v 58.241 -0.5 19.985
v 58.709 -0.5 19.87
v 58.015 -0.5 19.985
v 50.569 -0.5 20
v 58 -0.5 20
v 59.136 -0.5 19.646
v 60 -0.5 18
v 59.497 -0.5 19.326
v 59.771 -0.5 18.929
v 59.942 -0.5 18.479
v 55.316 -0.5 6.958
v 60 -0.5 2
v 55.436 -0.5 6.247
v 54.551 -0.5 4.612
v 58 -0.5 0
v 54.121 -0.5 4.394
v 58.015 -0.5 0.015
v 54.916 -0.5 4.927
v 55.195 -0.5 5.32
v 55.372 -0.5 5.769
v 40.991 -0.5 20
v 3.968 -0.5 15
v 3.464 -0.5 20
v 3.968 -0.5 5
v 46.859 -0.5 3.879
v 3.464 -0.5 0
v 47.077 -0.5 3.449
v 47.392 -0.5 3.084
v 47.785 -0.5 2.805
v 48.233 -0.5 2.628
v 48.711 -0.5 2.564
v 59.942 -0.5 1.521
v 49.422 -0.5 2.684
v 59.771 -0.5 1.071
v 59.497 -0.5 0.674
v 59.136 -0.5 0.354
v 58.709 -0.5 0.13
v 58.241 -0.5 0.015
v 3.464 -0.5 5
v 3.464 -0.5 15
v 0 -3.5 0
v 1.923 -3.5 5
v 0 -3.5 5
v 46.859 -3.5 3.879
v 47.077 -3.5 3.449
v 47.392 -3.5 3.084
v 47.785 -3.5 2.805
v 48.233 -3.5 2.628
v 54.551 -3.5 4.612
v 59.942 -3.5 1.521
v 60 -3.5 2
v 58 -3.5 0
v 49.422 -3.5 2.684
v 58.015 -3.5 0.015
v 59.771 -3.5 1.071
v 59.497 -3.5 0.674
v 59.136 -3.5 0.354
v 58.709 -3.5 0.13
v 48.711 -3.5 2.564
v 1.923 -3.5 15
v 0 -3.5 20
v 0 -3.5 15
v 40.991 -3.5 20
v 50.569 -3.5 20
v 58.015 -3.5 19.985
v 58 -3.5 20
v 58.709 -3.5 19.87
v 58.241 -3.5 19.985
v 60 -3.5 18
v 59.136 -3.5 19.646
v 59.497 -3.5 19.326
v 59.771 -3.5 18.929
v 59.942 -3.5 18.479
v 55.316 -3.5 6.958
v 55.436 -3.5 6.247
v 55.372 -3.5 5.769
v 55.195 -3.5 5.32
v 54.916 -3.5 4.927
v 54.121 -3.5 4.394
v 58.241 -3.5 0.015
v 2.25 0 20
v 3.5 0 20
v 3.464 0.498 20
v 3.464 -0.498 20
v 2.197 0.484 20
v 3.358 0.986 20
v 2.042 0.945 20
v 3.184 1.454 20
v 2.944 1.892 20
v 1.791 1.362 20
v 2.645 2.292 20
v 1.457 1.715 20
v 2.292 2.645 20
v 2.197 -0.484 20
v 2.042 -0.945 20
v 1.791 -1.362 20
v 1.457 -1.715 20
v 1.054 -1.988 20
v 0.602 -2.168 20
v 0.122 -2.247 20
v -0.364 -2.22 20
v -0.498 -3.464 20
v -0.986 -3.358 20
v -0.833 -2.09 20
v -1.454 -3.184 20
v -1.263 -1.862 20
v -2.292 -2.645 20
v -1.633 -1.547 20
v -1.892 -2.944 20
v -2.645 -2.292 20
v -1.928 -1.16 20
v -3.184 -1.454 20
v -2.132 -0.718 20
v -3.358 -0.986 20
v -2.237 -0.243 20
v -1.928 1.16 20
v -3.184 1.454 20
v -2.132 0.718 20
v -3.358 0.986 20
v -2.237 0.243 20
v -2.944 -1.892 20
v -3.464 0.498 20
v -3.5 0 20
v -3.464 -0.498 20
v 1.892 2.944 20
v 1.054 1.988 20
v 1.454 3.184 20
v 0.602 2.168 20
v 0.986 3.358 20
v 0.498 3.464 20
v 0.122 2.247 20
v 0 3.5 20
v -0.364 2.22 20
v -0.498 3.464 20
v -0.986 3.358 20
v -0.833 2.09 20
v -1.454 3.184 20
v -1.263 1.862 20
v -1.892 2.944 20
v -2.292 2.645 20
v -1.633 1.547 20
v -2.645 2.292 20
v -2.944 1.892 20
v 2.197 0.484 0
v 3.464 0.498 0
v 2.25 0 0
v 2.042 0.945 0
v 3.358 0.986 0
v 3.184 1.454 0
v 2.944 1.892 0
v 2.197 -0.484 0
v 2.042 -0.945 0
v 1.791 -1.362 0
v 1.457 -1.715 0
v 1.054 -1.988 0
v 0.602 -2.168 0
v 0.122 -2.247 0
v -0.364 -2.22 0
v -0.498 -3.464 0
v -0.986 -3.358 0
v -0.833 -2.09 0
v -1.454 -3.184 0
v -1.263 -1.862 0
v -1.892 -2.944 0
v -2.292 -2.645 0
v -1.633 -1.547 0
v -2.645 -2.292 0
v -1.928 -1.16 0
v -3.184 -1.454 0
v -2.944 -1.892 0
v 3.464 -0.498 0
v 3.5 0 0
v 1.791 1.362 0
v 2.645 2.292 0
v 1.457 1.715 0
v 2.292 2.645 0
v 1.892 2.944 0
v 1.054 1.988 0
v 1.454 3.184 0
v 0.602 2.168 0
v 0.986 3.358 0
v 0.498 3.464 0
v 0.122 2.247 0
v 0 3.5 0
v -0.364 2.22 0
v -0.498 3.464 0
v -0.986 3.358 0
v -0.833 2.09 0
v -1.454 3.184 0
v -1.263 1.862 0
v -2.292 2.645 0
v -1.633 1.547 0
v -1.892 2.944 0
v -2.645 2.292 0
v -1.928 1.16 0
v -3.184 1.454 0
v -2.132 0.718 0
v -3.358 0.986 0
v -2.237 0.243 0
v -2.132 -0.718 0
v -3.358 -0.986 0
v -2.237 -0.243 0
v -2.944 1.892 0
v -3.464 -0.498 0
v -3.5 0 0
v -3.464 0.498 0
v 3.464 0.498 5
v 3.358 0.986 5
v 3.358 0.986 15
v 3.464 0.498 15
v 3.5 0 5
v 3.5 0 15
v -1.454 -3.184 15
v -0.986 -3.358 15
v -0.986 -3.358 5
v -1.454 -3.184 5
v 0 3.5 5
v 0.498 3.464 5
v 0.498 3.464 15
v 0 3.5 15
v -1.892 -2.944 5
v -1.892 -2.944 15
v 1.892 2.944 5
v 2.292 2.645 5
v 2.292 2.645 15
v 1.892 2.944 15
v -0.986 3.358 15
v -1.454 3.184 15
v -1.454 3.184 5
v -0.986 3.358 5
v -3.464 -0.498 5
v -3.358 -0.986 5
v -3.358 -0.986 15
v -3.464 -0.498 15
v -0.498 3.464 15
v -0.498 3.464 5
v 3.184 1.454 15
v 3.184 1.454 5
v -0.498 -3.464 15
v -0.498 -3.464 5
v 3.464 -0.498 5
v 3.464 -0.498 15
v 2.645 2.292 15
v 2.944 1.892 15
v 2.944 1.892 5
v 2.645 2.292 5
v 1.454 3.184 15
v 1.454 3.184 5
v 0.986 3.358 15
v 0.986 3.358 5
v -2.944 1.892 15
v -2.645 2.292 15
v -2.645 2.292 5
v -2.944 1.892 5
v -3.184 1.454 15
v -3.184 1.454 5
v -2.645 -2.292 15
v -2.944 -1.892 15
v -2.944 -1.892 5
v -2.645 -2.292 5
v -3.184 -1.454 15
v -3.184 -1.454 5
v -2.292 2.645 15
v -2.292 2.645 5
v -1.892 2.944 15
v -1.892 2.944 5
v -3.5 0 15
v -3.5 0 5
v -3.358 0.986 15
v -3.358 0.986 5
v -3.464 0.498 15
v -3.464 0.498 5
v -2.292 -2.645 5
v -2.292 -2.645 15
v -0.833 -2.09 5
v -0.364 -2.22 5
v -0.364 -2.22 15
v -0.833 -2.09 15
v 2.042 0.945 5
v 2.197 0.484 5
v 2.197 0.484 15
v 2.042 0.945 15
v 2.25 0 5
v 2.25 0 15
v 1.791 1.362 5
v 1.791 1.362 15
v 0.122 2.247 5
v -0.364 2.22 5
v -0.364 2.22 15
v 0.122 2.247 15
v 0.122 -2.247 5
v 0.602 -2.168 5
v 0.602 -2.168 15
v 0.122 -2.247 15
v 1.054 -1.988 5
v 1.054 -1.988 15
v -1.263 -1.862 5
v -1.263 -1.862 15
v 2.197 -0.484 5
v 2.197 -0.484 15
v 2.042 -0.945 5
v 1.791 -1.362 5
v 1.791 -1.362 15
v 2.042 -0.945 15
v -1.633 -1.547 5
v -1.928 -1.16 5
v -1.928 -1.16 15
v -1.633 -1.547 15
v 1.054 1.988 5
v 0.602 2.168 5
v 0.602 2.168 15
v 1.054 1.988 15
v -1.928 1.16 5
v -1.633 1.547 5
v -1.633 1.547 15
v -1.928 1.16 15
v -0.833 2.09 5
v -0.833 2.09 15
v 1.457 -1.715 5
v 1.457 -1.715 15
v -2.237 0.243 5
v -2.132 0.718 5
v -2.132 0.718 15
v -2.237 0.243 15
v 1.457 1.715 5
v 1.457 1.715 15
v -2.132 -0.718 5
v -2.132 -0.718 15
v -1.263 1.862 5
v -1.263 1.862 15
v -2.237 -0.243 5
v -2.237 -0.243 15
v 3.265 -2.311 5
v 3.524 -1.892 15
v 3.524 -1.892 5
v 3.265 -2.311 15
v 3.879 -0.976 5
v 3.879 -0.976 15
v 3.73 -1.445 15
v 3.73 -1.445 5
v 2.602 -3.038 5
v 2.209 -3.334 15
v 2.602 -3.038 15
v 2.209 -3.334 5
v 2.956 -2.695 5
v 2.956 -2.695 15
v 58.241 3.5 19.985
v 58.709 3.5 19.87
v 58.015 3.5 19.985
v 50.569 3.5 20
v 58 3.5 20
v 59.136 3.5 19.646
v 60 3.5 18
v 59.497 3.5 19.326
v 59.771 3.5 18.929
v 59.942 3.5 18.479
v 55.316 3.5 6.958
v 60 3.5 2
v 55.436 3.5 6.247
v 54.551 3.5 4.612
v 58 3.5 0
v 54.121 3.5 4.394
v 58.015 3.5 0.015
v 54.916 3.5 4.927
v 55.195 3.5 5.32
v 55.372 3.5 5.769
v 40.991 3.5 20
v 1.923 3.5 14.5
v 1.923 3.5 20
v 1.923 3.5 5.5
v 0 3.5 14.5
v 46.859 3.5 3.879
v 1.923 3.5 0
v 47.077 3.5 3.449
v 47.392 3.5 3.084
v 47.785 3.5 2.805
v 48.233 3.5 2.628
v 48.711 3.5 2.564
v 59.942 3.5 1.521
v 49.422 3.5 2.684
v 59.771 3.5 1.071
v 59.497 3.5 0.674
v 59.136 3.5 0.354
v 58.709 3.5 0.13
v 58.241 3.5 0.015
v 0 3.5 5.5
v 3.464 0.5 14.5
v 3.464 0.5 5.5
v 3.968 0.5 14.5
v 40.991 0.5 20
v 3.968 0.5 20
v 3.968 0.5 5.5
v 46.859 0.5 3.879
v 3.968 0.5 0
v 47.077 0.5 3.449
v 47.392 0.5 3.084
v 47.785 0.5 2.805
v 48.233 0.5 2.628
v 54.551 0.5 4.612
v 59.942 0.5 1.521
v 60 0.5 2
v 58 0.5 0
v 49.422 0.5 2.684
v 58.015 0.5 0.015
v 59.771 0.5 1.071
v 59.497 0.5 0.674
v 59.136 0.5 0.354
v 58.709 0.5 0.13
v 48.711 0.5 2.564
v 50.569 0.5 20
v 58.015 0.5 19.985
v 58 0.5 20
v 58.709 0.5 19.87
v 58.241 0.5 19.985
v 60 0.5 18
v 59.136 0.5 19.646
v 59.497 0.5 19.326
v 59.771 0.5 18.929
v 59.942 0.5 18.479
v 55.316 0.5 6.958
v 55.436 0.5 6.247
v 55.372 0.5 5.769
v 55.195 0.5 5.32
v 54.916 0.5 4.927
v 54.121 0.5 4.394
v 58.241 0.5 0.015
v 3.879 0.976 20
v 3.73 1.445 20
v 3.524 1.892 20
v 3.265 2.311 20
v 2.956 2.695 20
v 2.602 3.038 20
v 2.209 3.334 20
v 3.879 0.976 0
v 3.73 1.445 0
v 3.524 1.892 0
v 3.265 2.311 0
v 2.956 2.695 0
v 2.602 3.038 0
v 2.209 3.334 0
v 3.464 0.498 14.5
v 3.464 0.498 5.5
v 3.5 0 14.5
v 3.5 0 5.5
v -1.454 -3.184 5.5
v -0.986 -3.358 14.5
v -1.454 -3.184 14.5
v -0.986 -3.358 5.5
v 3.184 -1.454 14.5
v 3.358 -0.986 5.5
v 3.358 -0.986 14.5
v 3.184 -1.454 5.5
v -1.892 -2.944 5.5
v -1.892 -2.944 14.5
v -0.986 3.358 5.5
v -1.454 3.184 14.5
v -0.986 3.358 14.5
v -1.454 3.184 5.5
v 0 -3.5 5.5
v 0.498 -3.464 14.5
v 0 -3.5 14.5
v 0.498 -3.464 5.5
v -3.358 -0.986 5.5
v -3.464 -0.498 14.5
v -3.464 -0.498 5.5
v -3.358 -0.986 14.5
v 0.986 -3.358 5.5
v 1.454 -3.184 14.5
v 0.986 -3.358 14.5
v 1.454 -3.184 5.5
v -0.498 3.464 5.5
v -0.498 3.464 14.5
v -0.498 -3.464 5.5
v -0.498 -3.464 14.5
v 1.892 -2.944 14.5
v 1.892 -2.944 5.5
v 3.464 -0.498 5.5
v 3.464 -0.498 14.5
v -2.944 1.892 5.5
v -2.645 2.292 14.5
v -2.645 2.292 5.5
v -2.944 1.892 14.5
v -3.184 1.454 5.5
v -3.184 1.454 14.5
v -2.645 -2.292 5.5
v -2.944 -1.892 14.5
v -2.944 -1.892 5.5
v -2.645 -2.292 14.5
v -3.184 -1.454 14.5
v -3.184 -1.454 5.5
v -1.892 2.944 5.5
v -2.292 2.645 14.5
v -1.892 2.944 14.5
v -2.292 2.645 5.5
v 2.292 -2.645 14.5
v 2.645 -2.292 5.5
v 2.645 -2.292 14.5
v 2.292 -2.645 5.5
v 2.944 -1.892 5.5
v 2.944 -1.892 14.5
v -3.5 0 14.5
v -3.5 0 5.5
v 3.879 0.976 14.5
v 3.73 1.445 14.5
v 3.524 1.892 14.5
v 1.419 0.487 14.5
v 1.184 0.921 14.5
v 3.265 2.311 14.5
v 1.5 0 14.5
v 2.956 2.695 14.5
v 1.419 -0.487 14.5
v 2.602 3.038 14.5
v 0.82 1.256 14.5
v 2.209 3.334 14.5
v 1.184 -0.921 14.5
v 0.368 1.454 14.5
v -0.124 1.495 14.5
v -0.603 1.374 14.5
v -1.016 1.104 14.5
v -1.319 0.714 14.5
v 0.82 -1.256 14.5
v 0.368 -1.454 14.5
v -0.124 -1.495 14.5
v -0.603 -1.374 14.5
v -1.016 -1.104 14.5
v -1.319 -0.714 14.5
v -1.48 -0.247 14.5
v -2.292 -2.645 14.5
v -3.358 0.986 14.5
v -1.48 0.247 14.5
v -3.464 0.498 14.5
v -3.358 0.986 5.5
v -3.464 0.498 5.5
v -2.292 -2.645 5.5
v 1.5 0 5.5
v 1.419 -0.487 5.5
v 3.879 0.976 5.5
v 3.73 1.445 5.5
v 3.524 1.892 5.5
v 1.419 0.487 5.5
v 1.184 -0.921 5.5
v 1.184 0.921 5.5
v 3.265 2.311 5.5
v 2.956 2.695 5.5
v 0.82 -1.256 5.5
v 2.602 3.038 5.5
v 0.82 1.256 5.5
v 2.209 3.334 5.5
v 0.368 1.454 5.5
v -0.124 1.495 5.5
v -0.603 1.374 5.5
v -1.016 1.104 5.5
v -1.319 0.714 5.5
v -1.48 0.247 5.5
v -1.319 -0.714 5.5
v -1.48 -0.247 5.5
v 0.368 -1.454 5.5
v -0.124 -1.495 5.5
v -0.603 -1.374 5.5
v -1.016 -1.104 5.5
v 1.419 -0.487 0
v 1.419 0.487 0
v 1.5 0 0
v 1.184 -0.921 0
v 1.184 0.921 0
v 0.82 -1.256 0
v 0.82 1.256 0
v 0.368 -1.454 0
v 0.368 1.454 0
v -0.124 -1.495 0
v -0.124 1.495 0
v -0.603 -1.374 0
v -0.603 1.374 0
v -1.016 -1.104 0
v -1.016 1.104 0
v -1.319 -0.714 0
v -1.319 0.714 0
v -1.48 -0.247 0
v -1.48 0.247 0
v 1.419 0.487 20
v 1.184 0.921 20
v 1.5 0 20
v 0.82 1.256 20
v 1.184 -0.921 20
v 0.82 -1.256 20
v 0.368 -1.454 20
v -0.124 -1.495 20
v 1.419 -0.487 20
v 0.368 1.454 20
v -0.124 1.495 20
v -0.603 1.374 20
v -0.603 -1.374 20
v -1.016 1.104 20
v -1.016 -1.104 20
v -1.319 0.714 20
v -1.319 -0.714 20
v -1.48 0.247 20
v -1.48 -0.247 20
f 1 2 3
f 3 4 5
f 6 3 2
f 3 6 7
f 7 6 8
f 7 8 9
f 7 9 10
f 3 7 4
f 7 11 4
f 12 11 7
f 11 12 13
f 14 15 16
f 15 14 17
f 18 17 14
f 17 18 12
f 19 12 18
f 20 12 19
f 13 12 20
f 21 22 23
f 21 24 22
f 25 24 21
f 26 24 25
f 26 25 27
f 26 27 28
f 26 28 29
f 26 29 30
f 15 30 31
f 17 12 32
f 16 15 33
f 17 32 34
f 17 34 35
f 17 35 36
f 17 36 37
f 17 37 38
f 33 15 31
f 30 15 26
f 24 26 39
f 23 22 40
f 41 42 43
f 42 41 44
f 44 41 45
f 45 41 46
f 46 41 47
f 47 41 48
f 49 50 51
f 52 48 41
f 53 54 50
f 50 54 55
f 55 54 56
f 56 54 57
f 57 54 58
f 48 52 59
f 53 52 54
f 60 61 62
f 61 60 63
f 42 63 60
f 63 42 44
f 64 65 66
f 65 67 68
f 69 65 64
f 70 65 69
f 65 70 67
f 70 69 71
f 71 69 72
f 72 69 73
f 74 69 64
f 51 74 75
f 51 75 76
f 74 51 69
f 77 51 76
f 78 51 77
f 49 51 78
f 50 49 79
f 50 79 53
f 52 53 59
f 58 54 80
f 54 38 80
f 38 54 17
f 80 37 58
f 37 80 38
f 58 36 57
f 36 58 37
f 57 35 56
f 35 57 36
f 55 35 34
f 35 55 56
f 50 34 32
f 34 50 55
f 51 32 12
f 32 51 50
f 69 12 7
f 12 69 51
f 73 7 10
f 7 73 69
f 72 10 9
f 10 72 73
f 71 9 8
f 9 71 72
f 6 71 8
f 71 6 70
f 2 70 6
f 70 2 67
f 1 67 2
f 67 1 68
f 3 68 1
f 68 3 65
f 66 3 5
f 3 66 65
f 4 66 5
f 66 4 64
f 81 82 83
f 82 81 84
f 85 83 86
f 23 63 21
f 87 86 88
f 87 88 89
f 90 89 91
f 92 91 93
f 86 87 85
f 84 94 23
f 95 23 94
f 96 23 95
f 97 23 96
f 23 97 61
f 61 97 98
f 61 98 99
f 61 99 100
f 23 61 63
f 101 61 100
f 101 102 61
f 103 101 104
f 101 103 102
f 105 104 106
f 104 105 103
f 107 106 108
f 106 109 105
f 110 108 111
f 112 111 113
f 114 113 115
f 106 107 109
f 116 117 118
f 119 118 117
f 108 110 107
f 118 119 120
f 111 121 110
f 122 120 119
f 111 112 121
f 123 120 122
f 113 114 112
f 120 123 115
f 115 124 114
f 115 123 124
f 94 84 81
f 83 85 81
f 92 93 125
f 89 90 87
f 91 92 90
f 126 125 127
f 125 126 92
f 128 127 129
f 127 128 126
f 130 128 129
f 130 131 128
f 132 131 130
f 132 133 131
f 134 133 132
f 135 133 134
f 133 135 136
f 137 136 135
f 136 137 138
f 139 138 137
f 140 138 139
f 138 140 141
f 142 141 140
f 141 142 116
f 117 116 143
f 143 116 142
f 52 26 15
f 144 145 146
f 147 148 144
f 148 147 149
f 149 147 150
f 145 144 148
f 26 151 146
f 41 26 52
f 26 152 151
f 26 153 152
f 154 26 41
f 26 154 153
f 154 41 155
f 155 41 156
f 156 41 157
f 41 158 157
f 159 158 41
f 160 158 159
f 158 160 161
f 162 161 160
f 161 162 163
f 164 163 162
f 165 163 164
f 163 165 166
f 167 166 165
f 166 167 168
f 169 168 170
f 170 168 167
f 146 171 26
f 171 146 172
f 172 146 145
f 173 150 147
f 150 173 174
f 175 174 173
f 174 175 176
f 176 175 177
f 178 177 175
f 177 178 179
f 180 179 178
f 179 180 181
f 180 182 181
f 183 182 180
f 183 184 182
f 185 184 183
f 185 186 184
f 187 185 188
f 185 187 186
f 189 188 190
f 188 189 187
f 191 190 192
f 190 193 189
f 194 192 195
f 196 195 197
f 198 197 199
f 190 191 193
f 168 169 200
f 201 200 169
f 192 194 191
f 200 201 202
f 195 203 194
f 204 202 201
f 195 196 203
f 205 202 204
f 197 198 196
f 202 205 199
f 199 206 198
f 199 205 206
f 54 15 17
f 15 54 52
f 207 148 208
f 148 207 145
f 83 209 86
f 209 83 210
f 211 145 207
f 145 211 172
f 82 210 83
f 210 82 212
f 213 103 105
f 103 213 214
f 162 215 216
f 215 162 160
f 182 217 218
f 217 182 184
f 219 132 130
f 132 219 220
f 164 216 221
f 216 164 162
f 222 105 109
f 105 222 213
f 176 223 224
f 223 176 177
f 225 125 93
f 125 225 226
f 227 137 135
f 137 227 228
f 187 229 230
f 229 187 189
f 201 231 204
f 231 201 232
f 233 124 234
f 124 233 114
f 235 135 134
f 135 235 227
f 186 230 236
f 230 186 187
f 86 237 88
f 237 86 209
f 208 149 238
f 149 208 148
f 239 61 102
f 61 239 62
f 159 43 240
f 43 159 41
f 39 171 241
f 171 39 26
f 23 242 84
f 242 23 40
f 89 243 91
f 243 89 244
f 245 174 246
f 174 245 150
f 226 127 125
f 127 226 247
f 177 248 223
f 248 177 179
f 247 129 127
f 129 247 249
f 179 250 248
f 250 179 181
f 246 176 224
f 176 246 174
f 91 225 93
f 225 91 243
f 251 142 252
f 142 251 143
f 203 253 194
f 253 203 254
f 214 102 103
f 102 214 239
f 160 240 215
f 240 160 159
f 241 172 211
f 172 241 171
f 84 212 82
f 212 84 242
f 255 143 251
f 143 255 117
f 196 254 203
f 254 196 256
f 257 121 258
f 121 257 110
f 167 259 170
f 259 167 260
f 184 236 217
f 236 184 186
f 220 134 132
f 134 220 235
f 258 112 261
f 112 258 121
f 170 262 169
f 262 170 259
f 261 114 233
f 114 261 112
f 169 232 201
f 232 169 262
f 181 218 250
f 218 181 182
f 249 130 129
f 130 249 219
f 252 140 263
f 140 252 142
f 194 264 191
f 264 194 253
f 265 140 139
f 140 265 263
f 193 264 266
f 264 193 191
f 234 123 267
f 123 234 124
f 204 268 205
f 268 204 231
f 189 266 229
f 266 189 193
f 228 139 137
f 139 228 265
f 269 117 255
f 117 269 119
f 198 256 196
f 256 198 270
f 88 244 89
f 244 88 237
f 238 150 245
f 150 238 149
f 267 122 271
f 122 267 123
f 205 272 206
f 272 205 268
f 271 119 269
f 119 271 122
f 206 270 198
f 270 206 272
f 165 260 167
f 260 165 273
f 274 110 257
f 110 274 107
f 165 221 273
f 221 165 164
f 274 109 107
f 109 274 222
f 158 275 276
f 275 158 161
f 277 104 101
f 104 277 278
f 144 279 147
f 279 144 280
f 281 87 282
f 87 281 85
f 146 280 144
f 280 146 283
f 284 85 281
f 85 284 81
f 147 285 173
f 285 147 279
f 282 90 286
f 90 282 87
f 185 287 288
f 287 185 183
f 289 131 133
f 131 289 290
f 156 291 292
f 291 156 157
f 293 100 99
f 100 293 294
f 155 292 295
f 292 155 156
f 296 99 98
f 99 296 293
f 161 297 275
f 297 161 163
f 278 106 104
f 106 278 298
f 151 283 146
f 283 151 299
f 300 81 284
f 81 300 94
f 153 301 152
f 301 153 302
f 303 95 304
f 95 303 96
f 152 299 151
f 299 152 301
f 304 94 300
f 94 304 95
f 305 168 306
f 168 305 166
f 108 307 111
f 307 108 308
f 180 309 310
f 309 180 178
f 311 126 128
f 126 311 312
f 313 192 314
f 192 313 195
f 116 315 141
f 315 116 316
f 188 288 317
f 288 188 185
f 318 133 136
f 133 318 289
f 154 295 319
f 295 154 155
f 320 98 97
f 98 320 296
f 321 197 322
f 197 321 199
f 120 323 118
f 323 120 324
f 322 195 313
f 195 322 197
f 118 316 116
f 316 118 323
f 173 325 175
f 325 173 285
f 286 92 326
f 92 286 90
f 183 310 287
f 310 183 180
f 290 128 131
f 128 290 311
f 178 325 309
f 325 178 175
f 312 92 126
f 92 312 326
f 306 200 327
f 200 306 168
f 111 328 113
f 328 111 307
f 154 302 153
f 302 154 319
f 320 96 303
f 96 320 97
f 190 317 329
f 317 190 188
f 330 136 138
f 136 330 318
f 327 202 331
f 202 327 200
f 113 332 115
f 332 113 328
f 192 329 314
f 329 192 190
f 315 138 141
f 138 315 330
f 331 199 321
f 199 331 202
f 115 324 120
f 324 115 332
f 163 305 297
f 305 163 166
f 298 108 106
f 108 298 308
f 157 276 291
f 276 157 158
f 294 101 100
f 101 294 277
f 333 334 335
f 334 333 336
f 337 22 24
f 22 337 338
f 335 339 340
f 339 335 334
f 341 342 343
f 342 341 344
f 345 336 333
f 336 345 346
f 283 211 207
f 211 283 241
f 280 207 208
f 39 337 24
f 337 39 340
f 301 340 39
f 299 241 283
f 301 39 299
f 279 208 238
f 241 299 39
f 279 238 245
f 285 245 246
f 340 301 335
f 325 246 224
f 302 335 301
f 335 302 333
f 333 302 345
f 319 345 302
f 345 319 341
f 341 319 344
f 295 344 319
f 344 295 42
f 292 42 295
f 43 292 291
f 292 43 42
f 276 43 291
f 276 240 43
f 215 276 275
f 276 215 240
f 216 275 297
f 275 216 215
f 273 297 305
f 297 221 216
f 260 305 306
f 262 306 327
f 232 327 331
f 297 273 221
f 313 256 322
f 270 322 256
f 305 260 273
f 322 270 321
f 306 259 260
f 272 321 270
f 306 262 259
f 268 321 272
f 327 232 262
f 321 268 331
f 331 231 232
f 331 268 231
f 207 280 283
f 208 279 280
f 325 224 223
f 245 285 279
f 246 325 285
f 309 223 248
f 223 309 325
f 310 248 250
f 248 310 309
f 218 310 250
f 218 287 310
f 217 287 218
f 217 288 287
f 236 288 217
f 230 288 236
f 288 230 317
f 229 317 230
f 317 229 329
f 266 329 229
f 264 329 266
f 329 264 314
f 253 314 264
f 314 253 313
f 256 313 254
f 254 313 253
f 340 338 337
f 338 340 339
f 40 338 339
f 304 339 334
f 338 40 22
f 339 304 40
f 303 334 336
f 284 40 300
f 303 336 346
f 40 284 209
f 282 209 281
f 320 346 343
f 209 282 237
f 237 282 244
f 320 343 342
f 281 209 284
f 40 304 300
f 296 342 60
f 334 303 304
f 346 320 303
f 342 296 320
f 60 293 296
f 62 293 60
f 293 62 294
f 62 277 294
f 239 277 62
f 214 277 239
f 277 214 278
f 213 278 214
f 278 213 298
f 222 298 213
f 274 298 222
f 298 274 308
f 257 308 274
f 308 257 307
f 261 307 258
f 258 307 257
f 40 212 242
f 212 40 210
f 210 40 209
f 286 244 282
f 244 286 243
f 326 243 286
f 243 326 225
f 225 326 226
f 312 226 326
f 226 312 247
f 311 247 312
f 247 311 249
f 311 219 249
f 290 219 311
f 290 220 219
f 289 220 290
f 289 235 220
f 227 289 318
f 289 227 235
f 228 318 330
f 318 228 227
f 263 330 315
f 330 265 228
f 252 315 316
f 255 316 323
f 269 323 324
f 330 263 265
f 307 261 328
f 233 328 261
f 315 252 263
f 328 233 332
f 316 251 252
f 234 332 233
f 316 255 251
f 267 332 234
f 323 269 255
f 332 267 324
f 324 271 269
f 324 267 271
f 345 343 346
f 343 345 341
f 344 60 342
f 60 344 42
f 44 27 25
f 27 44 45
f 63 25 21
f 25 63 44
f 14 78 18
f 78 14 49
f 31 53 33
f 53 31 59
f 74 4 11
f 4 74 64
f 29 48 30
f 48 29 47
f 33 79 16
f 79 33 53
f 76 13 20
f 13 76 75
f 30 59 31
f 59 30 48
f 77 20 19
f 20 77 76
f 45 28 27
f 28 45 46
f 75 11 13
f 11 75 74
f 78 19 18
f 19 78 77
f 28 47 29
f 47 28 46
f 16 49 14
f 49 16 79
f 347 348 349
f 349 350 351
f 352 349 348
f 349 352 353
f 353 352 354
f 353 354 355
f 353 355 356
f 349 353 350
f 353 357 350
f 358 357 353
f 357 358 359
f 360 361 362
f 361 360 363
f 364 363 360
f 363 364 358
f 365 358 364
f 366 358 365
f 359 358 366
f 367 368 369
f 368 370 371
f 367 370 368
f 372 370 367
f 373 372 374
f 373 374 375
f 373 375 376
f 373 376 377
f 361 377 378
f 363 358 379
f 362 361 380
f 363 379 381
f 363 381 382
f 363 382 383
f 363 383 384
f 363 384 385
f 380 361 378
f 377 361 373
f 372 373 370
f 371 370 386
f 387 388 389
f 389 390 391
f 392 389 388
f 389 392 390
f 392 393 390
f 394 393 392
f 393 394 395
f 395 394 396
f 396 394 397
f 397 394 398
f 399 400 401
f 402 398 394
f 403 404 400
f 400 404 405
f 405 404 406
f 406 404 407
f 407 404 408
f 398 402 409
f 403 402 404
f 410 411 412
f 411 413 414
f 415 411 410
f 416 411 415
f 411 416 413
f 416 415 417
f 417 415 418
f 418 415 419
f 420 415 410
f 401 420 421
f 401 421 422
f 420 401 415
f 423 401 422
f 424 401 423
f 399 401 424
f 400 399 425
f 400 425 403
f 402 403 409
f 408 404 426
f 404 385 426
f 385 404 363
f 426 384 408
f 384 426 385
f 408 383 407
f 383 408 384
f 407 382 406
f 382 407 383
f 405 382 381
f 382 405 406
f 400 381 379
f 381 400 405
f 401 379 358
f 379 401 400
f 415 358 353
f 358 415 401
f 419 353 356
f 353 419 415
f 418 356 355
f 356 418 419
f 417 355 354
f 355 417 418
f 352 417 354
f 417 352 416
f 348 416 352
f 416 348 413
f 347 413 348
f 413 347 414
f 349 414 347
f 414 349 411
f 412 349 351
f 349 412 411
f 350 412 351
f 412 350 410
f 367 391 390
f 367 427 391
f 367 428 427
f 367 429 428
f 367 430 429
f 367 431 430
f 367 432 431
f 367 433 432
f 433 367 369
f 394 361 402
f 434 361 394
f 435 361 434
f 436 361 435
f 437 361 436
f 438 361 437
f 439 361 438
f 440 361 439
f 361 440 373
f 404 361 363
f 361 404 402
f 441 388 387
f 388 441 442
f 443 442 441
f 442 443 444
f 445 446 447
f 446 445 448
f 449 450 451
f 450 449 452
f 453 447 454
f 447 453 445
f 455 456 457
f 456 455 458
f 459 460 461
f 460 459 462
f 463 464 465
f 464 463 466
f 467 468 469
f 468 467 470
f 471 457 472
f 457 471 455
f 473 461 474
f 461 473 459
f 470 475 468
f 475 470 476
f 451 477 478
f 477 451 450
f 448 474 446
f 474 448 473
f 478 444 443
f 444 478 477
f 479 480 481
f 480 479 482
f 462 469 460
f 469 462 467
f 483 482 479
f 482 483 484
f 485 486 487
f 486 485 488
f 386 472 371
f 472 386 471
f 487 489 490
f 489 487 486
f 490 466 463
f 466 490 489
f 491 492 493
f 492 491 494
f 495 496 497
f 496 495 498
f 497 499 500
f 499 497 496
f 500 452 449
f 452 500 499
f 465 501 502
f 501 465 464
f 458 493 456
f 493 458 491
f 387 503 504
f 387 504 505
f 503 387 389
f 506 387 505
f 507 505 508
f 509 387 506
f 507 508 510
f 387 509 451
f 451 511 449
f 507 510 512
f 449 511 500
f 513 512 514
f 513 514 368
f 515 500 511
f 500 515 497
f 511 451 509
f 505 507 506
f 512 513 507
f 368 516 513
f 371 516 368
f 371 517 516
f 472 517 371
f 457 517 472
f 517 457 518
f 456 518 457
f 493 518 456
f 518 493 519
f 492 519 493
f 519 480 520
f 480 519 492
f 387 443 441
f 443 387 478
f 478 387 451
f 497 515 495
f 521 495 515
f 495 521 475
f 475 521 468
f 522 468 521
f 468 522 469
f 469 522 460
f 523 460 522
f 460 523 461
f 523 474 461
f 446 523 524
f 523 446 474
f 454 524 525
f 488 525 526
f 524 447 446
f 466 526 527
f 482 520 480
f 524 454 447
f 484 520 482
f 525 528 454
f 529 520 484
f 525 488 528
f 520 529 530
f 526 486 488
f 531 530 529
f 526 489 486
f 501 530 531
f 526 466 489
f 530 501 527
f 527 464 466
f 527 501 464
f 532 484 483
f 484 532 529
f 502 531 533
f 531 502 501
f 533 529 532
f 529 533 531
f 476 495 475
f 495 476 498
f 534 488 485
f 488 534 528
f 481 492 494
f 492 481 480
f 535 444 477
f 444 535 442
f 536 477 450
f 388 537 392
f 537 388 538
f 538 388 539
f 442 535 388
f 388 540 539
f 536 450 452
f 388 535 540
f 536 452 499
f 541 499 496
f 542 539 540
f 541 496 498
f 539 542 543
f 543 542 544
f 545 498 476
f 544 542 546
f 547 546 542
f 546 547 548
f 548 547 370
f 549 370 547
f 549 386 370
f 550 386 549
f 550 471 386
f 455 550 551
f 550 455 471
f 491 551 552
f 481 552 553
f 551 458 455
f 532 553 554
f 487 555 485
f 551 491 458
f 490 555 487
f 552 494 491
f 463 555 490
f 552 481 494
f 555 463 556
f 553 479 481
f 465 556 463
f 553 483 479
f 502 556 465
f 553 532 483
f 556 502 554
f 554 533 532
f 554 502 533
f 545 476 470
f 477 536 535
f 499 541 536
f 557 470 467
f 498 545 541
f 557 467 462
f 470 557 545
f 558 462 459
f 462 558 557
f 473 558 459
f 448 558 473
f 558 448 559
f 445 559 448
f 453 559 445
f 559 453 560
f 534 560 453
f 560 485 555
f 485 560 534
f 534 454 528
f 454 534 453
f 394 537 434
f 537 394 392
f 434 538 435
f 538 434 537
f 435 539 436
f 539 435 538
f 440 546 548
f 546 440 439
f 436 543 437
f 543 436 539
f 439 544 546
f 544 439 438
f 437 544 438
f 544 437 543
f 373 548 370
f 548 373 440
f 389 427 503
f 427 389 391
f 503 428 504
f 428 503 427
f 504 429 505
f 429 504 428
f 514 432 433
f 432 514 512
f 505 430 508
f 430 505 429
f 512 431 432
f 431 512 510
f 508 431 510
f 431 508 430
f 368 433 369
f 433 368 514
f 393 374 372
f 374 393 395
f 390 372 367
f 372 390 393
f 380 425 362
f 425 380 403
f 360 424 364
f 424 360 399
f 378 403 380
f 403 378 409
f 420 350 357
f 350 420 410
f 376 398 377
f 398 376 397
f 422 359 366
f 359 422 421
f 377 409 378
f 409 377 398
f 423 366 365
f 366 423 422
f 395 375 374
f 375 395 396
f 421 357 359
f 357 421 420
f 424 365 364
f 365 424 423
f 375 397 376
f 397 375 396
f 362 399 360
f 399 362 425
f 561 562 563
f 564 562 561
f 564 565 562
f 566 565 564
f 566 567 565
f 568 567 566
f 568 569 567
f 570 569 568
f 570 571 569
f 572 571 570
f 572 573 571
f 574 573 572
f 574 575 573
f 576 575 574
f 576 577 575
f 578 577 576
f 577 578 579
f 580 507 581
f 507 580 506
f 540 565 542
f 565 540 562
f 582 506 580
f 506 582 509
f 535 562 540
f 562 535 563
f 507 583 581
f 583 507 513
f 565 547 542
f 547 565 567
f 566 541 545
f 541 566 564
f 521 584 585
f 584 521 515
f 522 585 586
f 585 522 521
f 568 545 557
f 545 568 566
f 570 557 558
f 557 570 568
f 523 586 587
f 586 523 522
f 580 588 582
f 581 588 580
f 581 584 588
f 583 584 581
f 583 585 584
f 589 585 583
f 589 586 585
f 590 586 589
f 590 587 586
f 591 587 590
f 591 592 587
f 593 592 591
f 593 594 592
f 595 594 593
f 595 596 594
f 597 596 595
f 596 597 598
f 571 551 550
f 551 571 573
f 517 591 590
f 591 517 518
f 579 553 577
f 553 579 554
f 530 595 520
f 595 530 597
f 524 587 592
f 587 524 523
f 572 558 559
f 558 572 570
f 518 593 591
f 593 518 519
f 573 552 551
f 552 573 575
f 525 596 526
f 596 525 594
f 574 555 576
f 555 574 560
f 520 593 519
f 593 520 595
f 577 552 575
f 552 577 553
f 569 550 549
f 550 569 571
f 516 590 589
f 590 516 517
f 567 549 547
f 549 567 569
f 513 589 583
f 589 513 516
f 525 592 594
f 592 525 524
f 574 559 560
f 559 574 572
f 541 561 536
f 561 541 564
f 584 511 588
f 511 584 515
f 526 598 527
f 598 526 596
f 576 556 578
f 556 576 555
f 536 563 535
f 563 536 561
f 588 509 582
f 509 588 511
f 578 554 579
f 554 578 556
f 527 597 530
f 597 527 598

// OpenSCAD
// Height of the stand
Height = 20;
// Length of the stand
Length = 60;
// Thickness of the stand wall..
Thickness = 3;
// You should give at least 1mm to 2mm more than the actual thickness.
PhoneThickness = 9;
// The angle (in degrees) that the holder is tilted at.
Tilt = 70;

/* [Hidden] */
$fa = 6;
$fs = 0.5;

// Plate: Flat portion of the stand. We have two of these, so we'll make it a module.
module Plate() {
    rotate([90,0,0])
        linear_extrude(Thickness)
            union() {
                polygon([
                    [0,0],[0,Height],
                    [Length-2,Height],[Length,Height-2],
                    [Length,2],[Length-2,0]]
                );
                translate([Length-2,Height-2]) circle(r=2);
                translate([Length-2,2]) circle(r=2);
            }
}

// PhoneSlot: Cut slot for phone. We have two of these, so we'll make it a module.
module PhoneSlot() {
    translate([Length-4-PhoneThickness/2*sin(Tilt),50,2+PhoneThickness/2*cos(Tilt)])
        rotate([90,Tilt,0])
            linear_extrude(100)
                translate([-100,-(PhoneThickness-4)/2,0])
                    offset(r=2)
                        square([100-2,PhoneThickness-4]);
}

// Outer Half
difference() {
    union() {
        translate ([0,-0.5,0]) Plate();
        cylinder(h=Height,r=Thickness+0.5);
    }
    cylinder(h=Height+5,r=Thickness/2+0.75); // Cut center hole    
    translate ([0,0,Height/4]) cylinder(h=Height/2,r=Thickness+1); // Slot
    PhoneSlot();
}

// Inner Half
union() {
    difference() {
        union() {
            translate ([0,Thickness+0.5,0]) Plate();
            translate ([0,0,Height/4+0.5]) cylinder(h=Height/2-1,r=Thickness+0.5);
        }
        cylinder(h=Height/4+0.5,r=Thickness+1); // Bottom Slot
        translate ([0,0,Height*3/4-0.5]) cylinder(h=Height/4+0.5,r=Thickness+1); // Top Slot
        PhoneSlot();
    }
    cylinder(h=Height,r=Thickness/2); // Cut center hole    
}
